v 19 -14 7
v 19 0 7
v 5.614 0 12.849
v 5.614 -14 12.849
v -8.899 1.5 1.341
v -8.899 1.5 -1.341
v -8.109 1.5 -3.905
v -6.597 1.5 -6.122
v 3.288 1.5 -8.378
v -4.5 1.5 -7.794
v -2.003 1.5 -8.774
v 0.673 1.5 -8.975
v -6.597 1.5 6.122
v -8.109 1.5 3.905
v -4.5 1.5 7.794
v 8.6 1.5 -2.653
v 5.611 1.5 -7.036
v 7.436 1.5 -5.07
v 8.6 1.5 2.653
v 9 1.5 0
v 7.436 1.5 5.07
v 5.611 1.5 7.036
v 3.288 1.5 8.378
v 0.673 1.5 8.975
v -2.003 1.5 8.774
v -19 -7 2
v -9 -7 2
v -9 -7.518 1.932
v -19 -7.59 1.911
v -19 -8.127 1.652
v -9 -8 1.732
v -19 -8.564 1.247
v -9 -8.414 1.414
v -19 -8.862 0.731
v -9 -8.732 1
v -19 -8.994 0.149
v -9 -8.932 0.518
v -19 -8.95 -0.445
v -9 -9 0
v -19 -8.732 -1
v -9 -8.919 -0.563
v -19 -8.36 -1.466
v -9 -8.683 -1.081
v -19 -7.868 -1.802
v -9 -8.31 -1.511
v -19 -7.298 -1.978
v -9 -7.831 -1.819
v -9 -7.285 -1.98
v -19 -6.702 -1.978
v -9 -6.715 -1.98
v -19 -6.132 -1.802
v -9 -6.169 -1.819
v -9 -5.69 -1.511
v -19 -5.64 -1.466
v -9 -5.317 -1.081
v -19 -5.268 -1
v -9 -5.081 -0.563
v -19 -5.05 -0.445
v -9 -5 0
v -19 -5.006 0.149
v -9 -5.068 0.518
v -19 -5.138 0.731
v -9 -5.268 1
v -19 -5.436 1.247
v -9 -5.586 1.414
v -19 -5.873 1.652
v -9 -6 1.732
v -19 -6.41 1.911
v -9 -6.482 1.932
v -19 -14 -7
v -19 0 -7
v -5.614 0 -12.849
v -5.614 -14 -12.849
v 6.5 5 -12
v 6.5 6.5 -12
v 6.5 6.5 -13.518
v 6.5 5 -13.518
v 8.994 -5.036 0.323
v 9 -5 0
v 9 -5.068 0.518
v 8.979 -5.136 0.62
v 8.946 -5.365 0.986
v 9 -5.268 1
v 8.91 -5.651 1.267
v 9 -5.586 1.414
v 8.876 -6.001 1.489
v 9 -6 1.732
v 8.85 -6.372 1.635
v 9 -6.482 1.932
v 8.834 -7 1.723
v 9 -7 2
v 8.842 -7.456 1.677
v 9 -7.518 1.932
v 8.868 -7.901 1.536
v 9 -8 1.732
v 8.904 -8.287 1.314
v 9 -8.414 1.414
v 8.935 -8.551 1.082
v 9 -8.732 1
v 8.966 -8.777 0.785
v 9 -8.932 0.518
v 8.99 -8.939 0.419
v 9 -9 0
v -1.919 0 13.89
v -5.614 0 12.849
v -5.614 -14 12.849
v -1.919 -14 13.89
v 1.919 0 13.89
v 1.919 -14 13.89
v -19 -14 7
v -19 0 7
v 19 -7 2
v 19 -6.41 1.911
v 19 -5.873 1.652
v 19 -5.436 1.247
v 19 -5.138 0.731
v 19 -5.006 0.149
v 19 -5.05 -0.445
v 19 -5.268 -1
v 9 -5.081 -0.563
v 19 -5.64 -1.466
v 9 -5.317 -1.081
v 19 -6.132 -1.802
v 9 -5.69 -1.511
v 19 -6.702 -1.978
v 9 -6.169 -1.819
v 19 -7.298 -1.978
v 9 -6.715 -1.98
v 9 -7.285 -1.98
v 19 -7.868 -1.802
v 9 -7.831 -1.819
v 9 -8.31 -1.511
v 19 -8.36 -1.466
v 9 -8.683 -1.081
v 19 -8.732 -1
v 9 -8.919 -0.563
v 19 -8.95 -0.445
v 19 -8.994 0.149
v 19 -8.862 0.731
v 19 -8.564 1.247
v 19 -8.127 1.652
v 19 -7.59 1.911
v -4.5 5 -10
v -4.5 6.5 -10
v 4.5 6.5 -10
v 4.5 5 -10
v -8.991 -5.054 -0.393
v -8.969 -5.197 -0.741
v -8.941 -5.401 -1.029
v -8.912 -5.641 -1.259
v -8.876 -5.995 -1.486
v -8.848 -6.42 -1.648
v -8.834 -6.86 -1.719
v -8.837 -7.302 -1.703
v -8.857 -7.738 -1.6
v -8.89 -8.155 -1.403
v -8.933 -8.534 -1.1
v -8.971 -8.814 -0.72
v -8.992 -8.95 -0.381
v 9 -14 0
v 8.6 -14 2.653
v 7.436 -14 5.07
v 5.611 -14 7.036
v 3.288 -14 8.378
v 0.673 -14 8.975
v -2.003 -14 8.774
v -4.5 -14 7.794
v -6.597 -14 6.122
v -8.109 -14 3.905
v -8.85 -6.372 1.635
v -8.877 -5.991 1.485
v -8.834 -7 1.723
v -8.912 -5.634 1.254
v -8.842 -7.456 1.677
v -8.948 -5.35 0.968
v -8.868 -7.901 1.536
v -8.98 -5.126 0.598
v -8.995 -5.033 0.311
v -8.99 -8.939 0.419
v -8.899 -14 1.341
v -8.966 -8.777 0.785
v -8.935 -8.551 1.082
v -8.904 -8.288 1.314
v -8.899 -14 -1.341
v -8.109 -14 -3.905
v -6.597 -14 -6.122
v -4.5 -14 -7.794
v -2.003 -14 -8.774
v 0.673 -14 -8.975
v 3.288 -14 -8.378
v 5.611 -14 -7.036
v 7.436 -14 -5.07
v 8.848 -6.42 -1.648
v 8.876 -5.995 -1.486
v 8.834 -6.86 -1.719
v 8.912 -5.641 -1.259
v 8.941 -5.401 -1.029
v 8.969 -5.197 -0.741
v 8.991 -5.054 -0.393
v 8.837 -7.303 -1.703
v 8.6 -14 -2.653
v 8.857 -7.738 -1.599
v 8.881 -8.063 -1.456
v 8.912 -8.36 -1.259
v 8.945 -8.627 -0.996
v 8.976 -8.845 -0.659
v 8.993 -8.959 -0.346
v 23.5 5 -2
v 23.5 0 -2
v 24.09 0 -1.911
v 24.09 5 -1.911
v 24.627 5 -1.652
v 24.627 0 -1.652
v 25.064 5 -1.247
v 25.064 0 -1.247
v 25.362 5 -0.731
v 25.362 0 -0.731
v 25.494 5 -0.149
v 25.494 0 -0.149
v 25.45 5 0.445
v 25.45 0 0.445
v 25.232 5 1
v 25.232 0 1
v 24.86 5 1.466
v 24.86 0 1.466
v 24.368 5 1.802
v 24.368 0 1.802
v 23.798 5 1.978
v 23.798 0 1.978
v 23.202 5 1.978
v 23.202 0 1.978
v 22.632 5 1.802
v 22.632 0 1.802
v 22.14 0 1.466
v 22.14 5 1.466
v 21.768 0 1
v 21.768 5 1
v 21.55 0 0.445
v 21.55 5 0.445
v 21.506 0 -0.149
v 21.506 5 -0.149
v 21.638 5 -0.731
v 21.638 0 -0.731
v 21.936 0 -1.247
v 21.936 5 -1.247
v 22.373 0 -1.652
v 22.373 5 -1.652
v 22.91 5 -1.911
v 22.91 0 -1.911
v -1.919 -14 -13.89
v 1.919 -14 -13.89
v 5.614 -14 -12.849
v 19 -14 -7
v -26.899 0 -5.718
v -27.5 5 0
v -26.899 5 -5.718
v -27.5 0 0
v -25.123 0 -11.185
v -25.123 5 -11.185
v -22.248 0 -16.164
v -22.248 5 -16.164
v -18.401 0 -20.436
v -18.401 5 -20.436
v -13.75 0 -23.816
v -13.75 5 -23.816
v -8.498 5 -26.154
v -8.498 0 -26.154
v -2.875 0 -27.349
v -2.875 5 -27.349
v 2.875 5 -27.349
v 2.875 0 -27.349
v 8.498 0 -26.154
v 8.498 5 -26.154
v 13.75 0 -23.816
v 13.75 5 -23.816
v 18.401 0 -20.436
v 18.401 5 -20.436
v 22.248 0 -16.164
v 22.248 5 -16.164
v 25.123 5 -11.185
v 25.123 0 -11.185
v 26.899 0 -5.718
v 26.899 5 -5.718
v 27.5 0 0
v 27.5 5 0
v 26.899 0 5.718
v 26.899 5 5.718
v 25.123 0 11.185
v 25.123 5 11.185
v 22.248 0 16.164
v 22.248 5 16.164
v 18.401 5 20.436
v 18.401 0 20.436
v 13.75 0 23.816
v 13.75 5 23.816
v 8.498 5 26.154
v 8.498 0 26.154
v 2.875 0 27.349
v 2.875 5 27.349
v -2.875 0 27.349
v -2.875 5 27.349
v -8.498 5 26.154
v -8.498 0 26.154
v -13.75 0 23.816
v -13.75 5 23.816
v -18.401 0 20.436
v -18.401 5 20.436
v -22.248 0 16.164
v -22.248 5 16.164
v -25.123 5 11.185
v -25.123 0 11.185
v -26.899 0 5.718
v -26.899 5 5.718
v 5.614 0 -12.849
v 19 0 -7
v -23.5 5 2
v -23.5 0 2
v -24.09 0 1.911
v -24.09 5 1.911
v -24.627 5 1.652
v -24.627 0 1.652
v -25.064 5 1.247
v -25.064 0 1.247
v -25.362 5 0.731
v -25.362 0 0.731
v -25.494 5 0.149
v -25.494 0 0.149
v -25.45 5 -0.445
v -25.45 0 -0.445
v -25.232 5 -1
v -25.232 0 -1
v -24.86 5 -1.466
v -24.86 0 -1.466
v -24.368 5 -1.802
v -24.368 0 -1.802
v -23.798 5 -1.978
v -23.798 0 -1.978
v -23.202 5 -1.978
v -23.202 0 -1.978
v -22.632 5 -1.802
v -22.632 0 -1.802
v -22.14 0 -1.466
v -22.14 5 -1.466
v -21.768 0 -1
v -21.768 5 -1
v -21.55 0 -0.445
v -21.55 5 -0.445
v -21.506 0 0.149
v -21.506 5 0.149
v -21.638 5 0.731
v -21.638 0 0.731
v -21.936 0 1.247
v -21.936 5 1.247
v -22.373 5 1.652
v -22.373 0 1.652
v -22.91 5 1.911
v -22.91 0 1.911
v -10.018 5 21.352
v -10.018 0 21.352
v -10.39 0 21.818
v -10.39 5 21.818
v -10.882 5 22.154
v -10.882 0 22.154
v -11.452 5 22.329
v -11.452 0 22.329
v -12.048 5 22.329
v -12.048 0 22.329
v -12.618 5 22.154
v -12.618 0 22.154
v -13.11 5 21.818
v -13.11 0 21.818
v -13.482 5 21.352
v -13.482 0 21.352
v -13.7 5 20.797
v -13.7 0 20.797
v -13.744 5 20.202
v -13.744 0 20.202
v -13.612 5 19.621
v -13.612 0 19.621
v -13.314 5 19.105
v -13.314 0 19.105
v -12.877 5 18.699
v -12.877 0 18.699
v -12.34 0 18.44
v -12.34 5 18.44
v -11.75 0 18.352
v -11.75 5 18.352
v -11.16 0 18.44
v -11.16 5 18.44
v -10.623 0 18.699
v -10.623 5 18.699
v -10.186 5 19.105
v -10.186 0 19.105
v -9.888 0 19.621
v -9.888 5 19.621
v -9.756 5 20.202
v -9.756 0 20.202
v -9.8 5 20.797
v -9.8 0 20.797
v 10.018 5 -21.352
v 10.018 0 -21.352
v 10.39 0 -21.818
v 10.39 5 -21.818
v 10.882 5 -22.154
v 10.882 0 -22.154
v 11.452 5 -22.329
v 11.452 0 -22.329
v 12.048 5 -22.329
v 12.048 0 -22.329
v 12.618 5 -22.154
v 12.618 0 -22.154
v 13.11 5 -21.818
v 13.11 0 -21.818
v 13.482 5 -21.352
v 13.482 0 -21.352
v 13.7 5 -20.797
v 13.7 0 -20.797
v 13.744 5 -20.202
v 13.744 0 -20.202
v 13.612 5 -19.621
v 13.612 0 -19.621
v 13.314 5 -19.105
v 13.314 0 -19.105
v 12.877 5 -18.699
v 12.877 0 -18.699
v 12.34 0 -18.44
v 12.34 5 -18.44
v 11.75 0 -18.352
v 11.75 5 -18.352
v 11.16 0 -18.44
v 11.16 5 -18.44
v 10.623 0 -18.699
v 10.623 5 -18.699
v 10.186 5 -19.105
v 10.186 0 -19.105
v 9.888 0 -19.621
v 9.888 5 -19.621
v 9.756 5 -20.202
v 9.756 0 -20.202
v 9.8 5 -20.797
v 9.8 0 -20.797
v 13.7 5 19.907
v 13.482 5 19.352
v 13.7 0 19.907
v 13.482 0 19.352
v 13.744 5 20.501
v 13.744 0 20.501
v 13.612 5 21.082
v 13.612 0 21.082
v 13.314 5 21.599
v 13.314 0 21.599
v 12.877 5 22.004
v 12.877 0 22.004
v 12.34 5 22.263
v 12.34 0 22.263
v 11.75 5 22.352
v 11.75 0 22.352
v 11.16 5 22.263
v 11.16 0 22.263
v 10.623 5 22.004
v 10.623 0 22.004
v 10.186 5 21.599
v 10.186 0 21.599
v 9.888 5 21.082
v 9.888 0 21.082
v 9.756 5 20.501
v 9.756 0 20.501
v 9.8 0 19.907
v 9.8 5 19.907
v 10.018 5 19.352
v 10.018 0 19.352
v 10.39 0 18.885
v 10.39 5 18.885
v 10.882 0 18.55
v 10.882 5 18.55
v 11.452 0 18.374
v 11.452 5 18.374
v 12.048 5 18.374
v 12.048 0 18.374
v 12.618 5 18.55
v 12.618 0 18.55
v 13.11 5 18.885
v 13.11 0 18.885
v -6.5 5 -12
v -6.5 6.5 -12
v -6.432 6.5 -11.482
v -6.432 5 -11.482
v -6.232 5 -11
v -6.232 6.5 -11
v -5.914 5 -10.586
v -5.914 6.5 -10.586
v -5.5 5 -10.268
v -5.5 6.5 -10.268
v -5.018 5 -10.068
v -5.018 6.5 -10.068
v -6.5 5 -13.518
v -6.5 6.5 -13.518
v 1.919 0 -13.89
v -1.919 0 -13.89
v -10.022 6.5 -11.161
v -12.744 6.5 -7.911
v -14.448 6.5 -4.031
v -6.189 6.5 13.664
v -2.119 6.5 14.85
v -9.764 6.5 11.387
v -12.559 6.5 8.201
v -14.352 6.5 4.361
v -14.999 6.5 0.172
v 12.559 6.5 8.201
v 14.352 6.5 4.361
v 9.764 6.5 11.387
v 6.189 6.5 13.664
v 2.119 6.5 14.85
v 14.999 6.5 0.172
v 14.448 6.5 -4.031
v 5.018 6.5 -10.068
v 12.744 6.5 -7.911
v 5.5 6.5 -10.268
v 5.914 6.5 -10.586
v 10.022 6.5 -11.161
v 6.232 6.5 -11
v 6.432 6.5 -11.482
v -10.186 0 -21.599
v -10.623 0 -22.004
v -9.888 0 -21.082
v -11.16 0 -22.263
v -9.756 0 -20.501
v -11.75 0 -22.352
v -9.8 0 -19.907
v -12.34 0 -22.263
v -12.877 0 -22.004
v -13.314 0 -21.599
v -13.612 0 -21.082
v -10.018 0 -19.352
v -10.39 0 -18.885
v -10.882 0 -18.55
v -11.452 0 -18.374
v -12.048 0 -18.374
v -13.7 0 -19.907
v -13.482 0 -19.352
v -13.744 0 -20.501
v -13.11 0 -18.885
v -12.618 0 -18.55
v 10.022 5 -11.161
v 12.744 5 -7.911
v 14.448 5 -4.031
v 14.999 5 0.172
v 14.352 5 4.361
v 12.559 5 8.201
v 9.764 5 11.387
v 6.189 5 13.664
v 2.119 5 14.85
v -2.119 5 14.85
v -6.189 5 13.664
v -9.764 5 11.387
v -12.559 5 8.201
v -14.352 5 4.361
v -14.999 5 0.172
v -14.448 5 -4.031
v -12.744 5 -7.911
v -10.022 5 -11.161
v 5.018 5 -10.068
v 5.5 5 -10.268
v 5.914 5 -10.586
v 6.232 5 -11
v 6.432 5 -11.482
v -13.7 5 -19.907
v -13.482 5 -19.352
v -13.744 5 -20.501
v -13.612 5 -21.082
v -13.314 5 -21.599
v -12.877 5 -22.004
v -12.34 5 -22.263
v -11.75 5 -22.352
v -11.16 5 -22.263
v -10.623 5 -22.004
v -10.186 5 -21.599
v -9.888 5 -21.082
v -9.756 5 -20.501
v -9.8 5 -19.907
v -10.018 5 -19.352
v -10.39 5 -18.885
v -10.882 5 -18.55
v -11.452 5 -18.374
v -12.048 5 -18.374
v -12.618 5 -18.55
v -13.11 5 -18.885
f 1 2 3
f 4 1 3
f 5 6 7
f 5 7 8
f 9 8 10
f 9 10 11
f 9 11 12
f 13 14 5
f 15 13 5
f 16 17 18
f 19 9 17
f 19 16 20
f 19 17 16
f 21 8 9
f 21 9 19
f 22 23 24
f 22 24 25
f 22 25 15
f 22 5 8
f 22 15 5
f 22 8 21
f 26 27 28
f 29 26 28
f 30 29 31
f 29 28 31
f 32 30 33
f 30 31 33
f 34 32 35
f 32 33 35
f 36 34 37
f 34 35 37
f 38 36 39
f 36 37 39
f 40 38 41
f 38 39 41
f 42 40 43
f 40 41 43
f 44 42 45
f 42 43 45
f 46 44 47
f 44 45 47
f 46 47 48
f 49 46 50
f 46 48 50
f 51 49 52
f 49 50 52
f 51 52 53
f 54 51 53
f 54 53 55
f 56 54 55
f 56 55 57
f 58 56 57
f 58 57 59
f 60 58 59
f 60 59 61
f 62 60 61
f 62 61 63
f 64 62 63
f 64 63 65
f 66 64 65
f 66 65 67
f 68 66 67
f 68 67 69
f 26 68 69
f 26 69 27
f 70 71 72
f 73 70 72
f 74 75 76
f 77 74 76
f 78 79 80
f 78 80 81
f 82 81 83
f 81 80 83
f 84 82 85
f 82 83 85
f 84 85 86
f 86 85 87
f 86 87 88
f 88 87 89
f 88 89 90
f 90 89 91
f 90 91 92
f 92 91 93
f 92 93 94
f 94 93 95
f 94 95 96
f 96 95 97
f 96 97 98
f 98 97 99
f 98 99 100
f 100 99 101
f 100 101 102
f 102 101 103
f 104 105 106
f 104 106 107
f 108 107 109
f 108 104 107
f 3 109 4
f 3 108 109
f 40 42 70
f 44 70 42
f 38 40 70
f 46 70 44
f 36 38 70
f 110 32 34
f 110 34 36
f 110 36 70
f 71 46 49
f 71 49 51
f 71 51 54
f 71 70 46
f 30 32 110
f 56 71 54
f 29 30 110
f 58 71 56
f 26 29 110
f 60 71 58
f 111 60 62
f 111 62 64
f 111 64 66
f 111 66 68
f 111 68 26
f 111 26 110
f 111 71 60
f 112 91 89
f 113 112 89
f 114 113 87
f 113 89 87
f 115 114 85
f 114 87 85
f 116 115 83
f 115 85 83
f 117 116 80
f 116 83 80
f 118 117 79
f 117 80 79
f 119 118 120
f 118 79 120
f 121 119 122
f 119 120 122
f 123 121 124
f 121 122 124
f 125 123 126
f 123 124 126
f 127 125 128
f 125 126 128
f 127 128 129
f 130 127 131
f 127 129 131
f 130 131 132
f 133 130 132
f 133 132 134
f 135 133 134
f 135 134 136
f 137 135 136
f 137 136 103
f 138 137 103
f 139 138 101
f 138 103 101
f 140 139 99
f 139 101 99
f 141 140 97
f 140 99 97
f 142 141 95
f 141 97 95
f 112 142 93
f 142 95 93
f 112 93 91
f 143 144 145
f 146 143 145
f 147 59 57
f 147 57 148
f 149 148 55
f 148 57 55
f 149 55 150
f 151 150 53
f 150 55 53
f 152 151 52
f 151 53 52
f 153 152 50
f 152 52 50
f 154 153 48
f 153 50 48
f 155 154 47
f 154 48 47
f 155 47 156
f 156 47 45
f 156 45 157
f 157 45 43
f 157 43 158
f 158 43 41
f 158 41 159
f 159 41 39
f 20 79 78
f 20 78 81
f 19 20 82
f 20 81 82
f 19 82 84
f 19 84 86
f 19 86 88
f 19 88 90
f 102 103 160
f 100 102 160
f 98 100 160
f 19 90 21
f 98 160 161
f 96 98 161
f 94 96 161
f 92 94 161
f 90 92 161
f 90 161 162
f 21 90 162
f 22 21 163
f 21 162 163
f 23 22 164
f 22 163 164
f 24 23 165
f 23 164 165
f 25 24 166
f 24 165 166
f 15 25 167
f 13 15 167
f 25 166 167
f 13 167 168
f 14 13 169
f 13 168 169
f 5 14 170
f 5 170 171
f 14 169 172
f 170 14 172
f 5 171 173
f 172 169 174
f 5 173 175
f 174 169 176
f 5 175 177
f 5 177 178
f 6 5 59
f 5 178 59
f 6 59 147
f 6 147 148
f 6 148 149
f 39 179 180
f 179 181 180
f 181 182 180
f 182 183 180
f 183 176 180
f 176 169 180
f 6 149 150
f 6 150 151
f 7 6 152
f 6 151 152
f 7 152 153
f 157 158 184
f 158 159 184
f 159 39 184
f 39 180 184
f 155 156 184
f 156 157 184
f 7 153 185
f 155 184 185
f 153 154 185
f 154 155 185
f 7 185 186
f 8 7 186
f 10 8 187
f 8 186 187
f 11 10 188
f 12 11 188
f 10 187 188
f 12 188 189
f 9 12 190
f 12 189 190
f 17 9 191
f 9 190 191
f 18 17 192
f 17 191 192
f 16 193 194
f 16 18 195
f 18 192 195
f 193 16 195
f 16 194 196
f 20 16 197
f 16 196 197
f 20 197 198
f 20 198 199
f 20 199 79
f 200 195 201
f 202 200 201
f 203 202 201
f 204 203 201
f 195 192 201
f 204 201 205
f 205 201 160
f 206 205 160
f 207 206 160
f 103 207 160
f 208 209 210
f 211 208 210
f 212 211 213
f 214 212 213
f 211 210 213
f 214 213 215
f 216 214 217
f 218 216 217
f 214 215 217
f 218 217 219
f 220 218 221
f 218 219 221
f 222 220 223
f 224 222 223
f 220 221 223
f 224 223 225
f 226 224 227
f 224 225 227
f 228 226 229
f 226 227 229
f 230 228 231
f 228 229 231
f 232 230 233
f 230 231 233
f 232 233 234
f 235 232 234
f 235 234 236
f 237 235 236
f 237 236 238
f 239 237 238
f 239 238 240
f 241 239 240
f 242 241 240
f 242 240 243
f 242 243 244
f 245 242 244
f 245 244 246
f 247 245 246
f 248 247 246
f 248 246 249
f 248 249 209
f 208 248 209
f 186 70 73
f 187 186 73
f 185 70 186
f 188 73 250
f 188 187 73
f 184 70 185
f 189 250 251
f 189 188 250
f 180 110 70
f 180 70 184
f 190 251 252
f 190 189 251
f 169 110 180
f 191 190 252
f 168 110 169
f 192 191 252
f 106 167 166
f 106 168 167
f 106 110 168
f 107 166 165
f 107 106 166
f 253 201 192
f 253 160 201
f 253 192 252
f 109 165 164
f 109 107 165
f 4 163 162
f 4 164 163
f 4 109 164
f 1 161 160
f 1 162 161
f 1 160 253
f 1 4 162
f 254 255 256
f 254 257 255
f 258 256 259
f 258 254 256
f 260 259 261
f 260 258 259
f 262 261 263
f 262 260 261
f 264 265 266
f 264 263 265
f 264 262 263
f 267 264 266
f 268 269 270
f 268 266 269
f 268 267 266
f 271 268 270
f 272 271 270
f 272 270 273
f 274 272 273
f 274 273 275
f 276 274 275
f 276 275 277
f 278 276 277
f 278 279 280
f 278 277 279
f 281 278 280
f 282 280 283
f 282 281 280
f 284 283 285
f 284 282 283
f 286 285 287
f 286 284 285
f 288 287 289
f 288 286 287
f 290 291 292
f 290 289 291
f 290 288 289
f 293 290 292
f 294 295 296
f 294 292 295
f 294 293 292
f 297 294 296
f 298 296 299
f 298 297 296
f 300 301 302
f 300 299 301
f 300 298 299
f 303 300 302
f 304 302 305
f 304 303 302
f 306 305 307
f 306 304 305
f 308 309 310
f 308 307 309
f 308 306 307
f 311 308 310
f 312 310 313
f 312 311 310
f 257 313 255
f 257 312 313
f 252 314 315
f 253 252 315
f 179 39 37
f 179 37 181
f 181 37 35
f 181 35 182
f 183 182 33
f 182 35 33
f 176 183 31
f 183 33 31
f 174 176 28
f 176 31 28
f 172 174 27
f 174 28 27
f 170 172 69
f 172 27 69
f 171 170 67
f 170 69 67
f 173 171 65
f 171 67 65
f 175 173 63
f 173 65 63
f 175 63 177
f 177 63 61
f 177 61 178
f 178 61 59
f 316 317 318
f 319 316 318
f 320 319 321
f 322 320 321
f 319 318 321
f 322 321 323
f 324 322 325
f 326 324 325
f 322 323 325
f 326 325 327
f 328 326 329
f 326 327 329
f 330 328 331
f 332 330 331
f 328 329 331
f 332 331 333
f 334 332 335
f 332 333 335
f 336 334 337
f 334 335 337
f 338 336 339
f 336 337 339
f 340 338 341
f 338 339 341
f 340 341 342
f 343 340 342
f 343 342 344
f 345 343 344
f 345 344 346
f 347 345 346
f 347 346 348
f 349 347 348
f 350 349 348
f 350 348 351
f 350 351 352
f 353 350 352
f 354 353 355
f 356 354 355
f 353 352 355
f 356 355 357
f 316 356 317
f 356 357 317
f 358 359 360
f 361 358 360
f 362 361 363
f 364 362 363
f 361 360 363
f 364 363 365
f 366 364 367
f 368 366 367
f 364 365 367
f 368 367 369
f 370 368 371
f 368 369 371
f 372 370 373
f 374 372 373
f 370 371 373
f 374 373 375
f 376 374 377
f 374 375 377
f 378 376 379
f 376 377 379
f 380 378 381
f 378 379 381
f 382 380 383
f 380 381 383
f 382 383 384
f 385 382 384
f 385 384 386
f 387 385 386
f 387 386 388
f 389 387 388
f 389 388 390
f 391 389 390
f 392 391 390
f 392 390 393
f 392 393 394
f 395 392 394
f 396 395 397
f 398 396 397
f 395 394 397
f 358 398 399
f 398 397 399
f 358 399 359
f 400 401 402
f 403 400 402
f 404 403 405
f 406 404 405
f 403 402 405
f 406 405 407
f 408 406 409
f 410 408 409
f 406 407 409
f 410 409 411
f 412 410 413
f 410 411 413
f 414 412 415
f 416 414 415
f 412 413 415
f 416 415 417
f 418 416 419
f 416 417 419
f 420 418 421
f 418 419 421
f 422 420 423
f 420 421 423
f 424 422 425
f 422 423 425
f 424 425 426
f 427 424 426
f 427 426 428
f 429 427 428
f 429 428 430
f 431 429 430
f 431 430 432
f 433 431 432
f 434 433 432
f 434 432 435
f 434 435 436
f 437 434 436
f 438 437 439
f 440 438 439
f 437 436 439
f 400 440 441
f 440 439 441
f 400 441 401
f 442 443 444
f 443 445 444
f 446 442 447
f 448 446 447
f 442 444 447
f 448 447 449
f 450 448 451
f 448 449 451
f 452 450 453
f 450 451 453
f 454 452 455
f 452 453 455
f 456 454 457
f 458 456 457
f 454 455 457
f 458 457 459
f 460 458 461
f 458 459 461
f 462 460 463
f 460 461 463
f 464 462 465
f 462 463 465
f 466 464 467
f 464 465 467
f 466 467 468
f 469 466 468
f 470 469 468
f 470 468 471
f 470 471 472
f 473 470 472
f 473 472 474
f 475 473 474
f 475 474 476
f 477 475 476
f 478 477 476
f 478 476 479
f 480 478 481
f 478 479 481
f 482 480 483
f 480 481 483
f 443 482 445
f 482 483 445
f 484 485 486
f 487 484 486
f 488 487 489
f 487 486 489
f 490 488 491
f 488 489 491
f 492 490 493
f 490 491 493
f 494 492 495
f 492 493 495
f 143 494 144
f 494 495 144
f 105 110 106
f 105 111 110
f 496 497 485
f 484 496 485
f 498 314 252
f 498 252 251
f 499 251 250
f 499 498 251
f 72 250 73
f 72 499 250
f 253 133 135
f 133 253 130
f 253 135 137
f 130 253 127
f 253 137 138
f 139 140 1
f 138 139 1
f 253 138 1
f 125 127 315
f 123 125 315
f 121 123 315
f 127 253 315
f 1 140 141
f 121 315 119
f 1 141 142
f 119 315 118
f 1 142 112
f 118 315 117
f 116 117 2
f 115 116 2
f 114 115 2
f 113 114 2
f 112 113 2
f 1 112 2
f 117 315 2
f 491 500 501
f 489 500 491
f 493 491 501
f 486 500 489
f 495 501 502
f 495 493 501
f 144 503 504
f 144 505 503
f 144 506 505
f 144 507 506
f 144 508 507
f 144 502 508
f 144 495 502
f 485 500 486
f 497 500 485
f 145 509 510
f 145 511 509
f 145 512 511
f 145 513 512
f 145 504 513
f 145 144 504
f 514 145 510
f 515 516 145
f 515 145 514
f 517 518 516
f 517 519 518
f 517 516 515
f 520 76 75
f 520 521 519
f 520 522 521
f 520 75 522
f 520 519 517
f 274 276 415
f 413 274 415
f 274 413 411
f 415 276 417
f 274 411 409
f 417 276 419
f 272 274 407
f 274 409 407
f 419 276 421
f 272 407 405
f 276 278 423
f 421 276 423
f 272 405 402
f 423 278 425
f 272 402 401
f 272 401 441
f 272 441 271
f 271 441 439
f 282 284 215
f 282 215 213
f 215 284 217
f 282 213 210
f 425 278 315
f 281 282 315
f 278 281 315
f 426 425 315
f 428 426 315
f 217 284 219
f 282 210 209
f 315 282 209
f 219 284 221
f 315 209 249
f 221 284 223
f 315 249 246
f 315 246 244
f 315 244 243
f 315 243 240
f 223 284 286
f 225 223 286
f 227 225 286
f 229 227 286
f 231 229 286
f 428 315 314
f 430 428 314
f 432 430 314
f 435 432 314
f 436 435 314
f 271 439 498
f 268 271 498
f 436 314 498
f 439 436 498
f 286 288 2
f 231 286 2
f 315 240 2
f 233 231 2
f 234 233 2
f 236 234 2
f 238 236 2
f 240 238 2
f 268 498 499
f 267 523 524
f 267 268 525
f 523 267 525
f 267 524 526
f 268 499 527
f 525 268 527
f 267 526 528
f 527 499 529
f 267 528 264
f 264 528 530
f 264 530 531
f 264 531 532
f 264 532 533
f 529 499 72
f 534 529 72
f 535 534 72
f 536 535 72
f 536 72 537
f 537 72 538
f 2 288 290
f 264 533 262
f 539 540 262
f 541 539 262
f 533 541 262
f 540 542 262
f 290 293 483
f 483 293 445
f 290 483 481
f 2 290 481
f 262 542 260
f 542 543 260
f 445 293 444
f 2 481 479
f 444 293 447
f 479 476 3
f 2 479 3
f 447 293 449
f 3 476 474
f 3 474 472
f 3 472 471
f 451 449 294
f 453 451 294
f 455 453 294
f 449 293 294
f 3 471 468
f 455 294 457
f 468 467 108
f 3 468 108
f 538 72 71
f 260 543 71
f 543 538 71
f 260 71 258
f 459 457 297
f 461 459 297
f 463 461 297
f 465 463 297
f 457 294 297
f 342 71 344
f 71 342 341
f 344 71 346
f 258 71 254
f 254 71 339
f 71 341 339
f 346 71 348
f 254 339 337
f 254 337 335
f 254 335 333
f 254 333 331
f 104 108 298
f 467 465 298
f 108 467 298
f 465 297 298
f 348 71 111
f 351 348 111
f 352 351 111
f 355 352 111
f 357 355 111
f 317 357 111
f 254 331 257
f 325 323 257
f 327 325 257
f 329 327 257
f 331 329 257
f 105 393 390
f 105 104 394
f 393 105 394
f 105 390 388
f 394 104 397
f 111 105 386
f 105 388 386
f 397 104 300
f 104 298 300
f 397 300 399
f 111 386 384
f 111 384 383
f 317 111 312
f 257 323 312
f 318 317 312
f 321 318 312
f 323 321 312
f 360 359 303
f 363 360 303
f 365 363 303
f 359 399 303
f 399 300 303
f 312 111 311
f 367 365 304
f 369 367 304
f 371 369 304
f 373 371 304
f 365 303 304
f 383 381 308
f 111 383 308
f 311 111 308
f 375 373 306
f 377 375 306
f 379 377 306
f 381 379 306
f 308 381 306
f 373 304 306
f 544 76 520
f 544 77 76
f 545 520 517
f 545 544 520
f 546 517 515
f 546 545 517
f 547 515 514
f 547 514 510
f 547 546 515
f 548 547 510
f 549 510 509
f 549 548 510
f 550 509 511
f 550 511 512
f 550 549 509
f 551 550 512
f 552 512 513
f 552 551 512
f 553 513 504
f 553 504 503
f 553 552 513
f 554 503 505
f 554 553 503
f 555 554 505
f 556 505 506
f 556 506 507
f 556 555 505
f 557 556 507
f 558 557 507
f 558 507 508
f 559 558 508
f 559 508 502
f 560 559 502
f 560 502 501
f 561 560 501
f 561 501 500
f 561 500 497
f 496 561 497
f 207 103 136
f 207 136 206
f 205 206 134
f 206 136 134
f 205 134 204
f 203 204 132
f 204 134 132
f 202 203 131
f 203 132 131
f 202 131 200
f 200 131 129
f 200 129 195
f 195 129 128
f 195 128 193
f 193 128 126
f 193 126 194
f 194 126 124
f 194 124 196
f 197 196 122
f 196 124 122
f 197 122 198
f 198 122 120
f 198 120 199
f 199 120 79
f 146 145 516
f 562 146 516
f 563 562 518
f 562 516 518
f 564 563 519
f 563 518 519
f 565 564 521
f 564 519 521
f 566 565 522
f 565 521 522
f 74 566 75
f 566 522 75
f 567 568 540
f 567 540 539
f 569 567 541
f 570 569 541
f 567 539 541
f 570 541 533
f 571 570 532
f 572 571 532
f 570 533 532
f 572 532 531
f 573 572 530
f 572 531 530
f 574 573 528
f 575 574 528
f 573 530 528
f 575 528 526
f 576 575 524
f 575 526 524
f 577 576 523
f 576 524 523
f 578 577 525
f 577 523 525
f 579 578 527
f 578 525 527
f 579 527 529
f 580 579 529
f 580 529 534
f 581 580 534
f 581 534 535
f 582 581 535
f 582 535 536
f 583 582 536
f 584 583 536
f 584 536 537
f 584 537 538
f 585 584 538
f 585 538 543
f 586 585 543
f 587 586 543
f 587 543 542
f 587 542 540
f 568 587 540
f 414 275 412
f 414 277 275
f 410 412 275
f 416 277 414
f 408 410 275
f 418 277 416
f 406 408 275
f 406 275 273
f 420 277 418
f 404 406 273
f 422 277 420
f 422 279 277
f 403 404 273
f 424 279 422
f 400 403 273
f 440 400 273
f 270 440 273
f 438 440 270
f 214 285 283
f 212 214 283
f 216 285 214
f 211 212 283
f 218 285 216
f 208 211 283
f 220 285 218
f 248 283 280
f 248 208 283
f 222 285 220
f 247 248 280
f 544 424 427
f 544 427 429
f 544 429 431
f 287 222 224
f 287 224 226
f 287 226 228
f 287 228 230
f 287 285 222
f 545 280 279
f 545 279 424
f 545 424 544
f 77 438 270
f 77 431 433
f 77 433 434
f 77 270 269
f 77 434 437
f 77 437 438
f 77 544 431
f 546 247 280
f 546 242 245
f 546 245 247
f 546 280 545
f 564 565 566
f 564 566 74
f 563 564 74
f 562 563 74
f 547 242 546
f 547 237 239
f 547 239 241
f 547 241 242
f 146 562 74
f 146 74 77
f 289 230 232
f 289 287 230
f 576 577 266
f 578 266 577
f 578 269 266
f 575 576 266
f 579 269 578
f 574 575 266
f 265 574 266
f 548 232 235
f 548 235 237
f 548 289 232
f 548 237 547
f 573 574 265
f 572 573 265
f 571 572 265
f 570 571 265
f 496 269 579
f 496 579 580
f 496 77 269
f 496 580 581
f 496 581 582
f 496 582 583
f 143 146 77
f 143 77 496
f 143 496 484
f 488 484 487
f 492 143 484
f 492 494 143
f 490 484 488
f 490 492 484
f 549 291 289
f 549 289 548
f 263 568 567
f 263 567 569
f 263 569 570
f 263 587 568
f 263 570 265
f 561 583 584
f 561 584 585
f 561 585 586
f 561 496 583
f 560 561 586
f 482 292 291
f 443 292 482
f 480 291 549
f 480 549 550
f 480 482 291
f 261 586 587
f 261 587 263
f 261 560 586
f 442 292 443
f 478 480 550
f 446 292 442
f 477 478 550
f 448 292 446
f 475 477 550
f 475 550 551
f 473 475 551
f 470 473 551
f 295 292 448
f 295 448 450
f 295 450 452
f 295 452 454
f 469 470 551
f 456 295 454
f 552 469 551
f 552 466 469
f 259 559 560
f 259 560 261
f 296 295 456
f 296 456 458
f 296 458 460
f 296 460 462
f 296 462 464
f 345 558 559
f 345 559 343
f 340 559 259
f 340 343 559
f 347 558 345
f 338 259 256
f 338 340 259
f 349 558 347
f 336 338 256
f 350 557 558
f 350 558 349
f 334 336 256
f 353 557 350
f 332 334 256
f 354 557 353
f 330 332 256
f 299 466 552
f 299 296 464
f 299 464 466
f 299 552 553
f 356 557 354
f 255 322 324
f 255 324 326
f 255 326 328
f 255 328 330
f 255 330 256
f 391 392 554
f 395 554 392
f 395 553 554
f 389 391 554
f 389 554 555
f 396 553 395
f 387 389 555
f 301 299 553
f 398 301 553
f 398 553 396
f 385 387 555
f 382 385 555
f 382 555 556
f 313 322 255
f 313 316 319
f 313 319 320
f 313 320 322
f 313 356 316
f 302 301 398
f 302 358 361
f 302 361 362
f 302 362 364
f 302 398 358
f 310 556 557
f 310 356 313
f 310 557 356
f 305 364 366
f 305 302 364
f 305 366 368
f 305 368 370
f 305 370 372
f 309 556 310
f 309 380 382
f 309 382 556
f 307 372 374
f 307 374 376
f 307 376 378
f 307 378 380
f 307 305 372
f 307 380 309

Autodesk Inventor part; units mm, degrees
ref_plane "YZ Plane" through (0, 0, 0) normal (1, 0, 0) x (0, 1, 0)
ref_plane "XZ Plane" through (0, 0, 0) normal (0, 1, 0) x (-1, 0, 0)
ref_plane "XY Plane" through (0, 0, 0) normal (0, 0, 1) x (1, 0, 0)
sketch "Skizze1" plane through (0, 0, 0) normal (0, 1, 0) x (-1, 0, 0)
  circle A0 centre (0, 0) radius 27.5
  dimension "d0" = 55
extrude "Extrusion1" add sketch "Skizze1" along normal blind 5
sketch "Skizze2" plane through (0, 5, 0) normal (0, 1, 0) x (1, 0, 0)
  circle A0 centre (0, 0) radius 15
  dimension "d4" = 30
extrude "Extrusion2" add sketch "Skizze2" along normal blind 1.5
sketch "Skizze3" plane through (0, 6.5, 0) normal (0, 1, 0) x (1, 0, 0)
  circle A0 centre (0, 0) radius 15 projected
  line L0 (-6.5, 13.5185) -> (-6.5, 12)
  line L1 (-4.5, 10) -> (4.5, 10)
  line L2 (6.5, 12) -> (6.5, 13.5185)
  line L3 (0, -15) -> (0, 15) construction
  arc A1 (-6.5, 12) -> (-4.5, 10) centre (-4.5, 12) ccw
  arc A2 (4.5, 10) -> (6.5, 12) centre (4.5, 12) ccw
  point P0 (-6.5, 10)
  point P1 (6.5, 10)
  dimension "d7" = 13
  dimension "d8" = 10
  dimension "d9" = 2
extrude "Extrusion3" cut sketch "Skizze3" against normal blind 1.5 contours L2 A2 L1 A1 L0 A0 picked at (0, 11.6667)
sketch "Skizze4" plane through (0, 5, 0) normal (0, 1, 0) x (1, 0, 0)
  circle A0 centre (0, 0) radius 23.5 construction
  point P0 (-23.5, 0)
  dimension "d12" = 47
hole "Bohrung1" at (-23.5, 5, 0) direction (0, -1, 0) diameter 4 end through all
pattern_circular "Runde Anordnung1" count 6 over 360 about axis through (0, 0, 0) along (0, 1, 0) of "Bohrung1"
sketch "Skizze5" plane through (0, 0, 0) normal (0, -1, 0) x (1, 0, 0)
  line L0 (-19, -7) -> (-19, 7)
  line L1 (-19, 7) -> (-5.6144, 12.8489)
  line L2 (-19, -7) -> (-5.6144, -12.8489)
  line L3 (5.6144, -12.8489) -> (19, -7)
  line L4 (19, -7) -> (19, 7)
  line L5 (19, 7) -> (5.6144, 12.8489)
  line L6 (0, -28.3232) -> (0, 28.3232) construction
  arc A0 (-5.6144, -12.8489) -> (5.6144, -12.8489) centre (0, 0) ccw
  arc A1 (5.6144, 12.8489) -> (-5.6144, 12.8489) centre (0, 0) ccw
  point P0 (-19, 0)
  point P1 (19, 0)
  dimension "d27" = 14
  dimension "d28" = 14
  dimension "d29" = 38
extrude "Extrusion4" add sketch "Skizze5" along normal blind 14
sketch "Skizze6" plane through (0, -14, 0) normal (0, -1, 0) x (1, 0, 0)
  circle A0 centre (0, 0) radius 9
  dimension "d32" = 18
extrude "Extrusion5" cut sketch "Skizze6" against normal blind 15.5
thread "Gewinde1" size "M18x2.5" class "6H" standard "ISO Metric profile" length 14
sketch "Skizze7" plane through (-19, 0, -7) normal (-1, 0, 0) x (0, 0, 1)
  line L0 (-5.8489, 0) -> (-5.8489, -14) projected
  line L1 (0, 0) -> (14, 0) projected
  point P0 (7, 0)
  point P1 (7, -7)
  point P2 (-5.8489, -7)
  point P3 (7, 0)
hole "Bohrung2" at (-19, -7, 0) direction (1, 0, 0) diameter 4 depth 10 tip angle 118
mirror "Mirror1" about plane through (0, 0, 0) normal (1, 0, 0) of "Bohrung2"
properties part number "109" material "Gold"
